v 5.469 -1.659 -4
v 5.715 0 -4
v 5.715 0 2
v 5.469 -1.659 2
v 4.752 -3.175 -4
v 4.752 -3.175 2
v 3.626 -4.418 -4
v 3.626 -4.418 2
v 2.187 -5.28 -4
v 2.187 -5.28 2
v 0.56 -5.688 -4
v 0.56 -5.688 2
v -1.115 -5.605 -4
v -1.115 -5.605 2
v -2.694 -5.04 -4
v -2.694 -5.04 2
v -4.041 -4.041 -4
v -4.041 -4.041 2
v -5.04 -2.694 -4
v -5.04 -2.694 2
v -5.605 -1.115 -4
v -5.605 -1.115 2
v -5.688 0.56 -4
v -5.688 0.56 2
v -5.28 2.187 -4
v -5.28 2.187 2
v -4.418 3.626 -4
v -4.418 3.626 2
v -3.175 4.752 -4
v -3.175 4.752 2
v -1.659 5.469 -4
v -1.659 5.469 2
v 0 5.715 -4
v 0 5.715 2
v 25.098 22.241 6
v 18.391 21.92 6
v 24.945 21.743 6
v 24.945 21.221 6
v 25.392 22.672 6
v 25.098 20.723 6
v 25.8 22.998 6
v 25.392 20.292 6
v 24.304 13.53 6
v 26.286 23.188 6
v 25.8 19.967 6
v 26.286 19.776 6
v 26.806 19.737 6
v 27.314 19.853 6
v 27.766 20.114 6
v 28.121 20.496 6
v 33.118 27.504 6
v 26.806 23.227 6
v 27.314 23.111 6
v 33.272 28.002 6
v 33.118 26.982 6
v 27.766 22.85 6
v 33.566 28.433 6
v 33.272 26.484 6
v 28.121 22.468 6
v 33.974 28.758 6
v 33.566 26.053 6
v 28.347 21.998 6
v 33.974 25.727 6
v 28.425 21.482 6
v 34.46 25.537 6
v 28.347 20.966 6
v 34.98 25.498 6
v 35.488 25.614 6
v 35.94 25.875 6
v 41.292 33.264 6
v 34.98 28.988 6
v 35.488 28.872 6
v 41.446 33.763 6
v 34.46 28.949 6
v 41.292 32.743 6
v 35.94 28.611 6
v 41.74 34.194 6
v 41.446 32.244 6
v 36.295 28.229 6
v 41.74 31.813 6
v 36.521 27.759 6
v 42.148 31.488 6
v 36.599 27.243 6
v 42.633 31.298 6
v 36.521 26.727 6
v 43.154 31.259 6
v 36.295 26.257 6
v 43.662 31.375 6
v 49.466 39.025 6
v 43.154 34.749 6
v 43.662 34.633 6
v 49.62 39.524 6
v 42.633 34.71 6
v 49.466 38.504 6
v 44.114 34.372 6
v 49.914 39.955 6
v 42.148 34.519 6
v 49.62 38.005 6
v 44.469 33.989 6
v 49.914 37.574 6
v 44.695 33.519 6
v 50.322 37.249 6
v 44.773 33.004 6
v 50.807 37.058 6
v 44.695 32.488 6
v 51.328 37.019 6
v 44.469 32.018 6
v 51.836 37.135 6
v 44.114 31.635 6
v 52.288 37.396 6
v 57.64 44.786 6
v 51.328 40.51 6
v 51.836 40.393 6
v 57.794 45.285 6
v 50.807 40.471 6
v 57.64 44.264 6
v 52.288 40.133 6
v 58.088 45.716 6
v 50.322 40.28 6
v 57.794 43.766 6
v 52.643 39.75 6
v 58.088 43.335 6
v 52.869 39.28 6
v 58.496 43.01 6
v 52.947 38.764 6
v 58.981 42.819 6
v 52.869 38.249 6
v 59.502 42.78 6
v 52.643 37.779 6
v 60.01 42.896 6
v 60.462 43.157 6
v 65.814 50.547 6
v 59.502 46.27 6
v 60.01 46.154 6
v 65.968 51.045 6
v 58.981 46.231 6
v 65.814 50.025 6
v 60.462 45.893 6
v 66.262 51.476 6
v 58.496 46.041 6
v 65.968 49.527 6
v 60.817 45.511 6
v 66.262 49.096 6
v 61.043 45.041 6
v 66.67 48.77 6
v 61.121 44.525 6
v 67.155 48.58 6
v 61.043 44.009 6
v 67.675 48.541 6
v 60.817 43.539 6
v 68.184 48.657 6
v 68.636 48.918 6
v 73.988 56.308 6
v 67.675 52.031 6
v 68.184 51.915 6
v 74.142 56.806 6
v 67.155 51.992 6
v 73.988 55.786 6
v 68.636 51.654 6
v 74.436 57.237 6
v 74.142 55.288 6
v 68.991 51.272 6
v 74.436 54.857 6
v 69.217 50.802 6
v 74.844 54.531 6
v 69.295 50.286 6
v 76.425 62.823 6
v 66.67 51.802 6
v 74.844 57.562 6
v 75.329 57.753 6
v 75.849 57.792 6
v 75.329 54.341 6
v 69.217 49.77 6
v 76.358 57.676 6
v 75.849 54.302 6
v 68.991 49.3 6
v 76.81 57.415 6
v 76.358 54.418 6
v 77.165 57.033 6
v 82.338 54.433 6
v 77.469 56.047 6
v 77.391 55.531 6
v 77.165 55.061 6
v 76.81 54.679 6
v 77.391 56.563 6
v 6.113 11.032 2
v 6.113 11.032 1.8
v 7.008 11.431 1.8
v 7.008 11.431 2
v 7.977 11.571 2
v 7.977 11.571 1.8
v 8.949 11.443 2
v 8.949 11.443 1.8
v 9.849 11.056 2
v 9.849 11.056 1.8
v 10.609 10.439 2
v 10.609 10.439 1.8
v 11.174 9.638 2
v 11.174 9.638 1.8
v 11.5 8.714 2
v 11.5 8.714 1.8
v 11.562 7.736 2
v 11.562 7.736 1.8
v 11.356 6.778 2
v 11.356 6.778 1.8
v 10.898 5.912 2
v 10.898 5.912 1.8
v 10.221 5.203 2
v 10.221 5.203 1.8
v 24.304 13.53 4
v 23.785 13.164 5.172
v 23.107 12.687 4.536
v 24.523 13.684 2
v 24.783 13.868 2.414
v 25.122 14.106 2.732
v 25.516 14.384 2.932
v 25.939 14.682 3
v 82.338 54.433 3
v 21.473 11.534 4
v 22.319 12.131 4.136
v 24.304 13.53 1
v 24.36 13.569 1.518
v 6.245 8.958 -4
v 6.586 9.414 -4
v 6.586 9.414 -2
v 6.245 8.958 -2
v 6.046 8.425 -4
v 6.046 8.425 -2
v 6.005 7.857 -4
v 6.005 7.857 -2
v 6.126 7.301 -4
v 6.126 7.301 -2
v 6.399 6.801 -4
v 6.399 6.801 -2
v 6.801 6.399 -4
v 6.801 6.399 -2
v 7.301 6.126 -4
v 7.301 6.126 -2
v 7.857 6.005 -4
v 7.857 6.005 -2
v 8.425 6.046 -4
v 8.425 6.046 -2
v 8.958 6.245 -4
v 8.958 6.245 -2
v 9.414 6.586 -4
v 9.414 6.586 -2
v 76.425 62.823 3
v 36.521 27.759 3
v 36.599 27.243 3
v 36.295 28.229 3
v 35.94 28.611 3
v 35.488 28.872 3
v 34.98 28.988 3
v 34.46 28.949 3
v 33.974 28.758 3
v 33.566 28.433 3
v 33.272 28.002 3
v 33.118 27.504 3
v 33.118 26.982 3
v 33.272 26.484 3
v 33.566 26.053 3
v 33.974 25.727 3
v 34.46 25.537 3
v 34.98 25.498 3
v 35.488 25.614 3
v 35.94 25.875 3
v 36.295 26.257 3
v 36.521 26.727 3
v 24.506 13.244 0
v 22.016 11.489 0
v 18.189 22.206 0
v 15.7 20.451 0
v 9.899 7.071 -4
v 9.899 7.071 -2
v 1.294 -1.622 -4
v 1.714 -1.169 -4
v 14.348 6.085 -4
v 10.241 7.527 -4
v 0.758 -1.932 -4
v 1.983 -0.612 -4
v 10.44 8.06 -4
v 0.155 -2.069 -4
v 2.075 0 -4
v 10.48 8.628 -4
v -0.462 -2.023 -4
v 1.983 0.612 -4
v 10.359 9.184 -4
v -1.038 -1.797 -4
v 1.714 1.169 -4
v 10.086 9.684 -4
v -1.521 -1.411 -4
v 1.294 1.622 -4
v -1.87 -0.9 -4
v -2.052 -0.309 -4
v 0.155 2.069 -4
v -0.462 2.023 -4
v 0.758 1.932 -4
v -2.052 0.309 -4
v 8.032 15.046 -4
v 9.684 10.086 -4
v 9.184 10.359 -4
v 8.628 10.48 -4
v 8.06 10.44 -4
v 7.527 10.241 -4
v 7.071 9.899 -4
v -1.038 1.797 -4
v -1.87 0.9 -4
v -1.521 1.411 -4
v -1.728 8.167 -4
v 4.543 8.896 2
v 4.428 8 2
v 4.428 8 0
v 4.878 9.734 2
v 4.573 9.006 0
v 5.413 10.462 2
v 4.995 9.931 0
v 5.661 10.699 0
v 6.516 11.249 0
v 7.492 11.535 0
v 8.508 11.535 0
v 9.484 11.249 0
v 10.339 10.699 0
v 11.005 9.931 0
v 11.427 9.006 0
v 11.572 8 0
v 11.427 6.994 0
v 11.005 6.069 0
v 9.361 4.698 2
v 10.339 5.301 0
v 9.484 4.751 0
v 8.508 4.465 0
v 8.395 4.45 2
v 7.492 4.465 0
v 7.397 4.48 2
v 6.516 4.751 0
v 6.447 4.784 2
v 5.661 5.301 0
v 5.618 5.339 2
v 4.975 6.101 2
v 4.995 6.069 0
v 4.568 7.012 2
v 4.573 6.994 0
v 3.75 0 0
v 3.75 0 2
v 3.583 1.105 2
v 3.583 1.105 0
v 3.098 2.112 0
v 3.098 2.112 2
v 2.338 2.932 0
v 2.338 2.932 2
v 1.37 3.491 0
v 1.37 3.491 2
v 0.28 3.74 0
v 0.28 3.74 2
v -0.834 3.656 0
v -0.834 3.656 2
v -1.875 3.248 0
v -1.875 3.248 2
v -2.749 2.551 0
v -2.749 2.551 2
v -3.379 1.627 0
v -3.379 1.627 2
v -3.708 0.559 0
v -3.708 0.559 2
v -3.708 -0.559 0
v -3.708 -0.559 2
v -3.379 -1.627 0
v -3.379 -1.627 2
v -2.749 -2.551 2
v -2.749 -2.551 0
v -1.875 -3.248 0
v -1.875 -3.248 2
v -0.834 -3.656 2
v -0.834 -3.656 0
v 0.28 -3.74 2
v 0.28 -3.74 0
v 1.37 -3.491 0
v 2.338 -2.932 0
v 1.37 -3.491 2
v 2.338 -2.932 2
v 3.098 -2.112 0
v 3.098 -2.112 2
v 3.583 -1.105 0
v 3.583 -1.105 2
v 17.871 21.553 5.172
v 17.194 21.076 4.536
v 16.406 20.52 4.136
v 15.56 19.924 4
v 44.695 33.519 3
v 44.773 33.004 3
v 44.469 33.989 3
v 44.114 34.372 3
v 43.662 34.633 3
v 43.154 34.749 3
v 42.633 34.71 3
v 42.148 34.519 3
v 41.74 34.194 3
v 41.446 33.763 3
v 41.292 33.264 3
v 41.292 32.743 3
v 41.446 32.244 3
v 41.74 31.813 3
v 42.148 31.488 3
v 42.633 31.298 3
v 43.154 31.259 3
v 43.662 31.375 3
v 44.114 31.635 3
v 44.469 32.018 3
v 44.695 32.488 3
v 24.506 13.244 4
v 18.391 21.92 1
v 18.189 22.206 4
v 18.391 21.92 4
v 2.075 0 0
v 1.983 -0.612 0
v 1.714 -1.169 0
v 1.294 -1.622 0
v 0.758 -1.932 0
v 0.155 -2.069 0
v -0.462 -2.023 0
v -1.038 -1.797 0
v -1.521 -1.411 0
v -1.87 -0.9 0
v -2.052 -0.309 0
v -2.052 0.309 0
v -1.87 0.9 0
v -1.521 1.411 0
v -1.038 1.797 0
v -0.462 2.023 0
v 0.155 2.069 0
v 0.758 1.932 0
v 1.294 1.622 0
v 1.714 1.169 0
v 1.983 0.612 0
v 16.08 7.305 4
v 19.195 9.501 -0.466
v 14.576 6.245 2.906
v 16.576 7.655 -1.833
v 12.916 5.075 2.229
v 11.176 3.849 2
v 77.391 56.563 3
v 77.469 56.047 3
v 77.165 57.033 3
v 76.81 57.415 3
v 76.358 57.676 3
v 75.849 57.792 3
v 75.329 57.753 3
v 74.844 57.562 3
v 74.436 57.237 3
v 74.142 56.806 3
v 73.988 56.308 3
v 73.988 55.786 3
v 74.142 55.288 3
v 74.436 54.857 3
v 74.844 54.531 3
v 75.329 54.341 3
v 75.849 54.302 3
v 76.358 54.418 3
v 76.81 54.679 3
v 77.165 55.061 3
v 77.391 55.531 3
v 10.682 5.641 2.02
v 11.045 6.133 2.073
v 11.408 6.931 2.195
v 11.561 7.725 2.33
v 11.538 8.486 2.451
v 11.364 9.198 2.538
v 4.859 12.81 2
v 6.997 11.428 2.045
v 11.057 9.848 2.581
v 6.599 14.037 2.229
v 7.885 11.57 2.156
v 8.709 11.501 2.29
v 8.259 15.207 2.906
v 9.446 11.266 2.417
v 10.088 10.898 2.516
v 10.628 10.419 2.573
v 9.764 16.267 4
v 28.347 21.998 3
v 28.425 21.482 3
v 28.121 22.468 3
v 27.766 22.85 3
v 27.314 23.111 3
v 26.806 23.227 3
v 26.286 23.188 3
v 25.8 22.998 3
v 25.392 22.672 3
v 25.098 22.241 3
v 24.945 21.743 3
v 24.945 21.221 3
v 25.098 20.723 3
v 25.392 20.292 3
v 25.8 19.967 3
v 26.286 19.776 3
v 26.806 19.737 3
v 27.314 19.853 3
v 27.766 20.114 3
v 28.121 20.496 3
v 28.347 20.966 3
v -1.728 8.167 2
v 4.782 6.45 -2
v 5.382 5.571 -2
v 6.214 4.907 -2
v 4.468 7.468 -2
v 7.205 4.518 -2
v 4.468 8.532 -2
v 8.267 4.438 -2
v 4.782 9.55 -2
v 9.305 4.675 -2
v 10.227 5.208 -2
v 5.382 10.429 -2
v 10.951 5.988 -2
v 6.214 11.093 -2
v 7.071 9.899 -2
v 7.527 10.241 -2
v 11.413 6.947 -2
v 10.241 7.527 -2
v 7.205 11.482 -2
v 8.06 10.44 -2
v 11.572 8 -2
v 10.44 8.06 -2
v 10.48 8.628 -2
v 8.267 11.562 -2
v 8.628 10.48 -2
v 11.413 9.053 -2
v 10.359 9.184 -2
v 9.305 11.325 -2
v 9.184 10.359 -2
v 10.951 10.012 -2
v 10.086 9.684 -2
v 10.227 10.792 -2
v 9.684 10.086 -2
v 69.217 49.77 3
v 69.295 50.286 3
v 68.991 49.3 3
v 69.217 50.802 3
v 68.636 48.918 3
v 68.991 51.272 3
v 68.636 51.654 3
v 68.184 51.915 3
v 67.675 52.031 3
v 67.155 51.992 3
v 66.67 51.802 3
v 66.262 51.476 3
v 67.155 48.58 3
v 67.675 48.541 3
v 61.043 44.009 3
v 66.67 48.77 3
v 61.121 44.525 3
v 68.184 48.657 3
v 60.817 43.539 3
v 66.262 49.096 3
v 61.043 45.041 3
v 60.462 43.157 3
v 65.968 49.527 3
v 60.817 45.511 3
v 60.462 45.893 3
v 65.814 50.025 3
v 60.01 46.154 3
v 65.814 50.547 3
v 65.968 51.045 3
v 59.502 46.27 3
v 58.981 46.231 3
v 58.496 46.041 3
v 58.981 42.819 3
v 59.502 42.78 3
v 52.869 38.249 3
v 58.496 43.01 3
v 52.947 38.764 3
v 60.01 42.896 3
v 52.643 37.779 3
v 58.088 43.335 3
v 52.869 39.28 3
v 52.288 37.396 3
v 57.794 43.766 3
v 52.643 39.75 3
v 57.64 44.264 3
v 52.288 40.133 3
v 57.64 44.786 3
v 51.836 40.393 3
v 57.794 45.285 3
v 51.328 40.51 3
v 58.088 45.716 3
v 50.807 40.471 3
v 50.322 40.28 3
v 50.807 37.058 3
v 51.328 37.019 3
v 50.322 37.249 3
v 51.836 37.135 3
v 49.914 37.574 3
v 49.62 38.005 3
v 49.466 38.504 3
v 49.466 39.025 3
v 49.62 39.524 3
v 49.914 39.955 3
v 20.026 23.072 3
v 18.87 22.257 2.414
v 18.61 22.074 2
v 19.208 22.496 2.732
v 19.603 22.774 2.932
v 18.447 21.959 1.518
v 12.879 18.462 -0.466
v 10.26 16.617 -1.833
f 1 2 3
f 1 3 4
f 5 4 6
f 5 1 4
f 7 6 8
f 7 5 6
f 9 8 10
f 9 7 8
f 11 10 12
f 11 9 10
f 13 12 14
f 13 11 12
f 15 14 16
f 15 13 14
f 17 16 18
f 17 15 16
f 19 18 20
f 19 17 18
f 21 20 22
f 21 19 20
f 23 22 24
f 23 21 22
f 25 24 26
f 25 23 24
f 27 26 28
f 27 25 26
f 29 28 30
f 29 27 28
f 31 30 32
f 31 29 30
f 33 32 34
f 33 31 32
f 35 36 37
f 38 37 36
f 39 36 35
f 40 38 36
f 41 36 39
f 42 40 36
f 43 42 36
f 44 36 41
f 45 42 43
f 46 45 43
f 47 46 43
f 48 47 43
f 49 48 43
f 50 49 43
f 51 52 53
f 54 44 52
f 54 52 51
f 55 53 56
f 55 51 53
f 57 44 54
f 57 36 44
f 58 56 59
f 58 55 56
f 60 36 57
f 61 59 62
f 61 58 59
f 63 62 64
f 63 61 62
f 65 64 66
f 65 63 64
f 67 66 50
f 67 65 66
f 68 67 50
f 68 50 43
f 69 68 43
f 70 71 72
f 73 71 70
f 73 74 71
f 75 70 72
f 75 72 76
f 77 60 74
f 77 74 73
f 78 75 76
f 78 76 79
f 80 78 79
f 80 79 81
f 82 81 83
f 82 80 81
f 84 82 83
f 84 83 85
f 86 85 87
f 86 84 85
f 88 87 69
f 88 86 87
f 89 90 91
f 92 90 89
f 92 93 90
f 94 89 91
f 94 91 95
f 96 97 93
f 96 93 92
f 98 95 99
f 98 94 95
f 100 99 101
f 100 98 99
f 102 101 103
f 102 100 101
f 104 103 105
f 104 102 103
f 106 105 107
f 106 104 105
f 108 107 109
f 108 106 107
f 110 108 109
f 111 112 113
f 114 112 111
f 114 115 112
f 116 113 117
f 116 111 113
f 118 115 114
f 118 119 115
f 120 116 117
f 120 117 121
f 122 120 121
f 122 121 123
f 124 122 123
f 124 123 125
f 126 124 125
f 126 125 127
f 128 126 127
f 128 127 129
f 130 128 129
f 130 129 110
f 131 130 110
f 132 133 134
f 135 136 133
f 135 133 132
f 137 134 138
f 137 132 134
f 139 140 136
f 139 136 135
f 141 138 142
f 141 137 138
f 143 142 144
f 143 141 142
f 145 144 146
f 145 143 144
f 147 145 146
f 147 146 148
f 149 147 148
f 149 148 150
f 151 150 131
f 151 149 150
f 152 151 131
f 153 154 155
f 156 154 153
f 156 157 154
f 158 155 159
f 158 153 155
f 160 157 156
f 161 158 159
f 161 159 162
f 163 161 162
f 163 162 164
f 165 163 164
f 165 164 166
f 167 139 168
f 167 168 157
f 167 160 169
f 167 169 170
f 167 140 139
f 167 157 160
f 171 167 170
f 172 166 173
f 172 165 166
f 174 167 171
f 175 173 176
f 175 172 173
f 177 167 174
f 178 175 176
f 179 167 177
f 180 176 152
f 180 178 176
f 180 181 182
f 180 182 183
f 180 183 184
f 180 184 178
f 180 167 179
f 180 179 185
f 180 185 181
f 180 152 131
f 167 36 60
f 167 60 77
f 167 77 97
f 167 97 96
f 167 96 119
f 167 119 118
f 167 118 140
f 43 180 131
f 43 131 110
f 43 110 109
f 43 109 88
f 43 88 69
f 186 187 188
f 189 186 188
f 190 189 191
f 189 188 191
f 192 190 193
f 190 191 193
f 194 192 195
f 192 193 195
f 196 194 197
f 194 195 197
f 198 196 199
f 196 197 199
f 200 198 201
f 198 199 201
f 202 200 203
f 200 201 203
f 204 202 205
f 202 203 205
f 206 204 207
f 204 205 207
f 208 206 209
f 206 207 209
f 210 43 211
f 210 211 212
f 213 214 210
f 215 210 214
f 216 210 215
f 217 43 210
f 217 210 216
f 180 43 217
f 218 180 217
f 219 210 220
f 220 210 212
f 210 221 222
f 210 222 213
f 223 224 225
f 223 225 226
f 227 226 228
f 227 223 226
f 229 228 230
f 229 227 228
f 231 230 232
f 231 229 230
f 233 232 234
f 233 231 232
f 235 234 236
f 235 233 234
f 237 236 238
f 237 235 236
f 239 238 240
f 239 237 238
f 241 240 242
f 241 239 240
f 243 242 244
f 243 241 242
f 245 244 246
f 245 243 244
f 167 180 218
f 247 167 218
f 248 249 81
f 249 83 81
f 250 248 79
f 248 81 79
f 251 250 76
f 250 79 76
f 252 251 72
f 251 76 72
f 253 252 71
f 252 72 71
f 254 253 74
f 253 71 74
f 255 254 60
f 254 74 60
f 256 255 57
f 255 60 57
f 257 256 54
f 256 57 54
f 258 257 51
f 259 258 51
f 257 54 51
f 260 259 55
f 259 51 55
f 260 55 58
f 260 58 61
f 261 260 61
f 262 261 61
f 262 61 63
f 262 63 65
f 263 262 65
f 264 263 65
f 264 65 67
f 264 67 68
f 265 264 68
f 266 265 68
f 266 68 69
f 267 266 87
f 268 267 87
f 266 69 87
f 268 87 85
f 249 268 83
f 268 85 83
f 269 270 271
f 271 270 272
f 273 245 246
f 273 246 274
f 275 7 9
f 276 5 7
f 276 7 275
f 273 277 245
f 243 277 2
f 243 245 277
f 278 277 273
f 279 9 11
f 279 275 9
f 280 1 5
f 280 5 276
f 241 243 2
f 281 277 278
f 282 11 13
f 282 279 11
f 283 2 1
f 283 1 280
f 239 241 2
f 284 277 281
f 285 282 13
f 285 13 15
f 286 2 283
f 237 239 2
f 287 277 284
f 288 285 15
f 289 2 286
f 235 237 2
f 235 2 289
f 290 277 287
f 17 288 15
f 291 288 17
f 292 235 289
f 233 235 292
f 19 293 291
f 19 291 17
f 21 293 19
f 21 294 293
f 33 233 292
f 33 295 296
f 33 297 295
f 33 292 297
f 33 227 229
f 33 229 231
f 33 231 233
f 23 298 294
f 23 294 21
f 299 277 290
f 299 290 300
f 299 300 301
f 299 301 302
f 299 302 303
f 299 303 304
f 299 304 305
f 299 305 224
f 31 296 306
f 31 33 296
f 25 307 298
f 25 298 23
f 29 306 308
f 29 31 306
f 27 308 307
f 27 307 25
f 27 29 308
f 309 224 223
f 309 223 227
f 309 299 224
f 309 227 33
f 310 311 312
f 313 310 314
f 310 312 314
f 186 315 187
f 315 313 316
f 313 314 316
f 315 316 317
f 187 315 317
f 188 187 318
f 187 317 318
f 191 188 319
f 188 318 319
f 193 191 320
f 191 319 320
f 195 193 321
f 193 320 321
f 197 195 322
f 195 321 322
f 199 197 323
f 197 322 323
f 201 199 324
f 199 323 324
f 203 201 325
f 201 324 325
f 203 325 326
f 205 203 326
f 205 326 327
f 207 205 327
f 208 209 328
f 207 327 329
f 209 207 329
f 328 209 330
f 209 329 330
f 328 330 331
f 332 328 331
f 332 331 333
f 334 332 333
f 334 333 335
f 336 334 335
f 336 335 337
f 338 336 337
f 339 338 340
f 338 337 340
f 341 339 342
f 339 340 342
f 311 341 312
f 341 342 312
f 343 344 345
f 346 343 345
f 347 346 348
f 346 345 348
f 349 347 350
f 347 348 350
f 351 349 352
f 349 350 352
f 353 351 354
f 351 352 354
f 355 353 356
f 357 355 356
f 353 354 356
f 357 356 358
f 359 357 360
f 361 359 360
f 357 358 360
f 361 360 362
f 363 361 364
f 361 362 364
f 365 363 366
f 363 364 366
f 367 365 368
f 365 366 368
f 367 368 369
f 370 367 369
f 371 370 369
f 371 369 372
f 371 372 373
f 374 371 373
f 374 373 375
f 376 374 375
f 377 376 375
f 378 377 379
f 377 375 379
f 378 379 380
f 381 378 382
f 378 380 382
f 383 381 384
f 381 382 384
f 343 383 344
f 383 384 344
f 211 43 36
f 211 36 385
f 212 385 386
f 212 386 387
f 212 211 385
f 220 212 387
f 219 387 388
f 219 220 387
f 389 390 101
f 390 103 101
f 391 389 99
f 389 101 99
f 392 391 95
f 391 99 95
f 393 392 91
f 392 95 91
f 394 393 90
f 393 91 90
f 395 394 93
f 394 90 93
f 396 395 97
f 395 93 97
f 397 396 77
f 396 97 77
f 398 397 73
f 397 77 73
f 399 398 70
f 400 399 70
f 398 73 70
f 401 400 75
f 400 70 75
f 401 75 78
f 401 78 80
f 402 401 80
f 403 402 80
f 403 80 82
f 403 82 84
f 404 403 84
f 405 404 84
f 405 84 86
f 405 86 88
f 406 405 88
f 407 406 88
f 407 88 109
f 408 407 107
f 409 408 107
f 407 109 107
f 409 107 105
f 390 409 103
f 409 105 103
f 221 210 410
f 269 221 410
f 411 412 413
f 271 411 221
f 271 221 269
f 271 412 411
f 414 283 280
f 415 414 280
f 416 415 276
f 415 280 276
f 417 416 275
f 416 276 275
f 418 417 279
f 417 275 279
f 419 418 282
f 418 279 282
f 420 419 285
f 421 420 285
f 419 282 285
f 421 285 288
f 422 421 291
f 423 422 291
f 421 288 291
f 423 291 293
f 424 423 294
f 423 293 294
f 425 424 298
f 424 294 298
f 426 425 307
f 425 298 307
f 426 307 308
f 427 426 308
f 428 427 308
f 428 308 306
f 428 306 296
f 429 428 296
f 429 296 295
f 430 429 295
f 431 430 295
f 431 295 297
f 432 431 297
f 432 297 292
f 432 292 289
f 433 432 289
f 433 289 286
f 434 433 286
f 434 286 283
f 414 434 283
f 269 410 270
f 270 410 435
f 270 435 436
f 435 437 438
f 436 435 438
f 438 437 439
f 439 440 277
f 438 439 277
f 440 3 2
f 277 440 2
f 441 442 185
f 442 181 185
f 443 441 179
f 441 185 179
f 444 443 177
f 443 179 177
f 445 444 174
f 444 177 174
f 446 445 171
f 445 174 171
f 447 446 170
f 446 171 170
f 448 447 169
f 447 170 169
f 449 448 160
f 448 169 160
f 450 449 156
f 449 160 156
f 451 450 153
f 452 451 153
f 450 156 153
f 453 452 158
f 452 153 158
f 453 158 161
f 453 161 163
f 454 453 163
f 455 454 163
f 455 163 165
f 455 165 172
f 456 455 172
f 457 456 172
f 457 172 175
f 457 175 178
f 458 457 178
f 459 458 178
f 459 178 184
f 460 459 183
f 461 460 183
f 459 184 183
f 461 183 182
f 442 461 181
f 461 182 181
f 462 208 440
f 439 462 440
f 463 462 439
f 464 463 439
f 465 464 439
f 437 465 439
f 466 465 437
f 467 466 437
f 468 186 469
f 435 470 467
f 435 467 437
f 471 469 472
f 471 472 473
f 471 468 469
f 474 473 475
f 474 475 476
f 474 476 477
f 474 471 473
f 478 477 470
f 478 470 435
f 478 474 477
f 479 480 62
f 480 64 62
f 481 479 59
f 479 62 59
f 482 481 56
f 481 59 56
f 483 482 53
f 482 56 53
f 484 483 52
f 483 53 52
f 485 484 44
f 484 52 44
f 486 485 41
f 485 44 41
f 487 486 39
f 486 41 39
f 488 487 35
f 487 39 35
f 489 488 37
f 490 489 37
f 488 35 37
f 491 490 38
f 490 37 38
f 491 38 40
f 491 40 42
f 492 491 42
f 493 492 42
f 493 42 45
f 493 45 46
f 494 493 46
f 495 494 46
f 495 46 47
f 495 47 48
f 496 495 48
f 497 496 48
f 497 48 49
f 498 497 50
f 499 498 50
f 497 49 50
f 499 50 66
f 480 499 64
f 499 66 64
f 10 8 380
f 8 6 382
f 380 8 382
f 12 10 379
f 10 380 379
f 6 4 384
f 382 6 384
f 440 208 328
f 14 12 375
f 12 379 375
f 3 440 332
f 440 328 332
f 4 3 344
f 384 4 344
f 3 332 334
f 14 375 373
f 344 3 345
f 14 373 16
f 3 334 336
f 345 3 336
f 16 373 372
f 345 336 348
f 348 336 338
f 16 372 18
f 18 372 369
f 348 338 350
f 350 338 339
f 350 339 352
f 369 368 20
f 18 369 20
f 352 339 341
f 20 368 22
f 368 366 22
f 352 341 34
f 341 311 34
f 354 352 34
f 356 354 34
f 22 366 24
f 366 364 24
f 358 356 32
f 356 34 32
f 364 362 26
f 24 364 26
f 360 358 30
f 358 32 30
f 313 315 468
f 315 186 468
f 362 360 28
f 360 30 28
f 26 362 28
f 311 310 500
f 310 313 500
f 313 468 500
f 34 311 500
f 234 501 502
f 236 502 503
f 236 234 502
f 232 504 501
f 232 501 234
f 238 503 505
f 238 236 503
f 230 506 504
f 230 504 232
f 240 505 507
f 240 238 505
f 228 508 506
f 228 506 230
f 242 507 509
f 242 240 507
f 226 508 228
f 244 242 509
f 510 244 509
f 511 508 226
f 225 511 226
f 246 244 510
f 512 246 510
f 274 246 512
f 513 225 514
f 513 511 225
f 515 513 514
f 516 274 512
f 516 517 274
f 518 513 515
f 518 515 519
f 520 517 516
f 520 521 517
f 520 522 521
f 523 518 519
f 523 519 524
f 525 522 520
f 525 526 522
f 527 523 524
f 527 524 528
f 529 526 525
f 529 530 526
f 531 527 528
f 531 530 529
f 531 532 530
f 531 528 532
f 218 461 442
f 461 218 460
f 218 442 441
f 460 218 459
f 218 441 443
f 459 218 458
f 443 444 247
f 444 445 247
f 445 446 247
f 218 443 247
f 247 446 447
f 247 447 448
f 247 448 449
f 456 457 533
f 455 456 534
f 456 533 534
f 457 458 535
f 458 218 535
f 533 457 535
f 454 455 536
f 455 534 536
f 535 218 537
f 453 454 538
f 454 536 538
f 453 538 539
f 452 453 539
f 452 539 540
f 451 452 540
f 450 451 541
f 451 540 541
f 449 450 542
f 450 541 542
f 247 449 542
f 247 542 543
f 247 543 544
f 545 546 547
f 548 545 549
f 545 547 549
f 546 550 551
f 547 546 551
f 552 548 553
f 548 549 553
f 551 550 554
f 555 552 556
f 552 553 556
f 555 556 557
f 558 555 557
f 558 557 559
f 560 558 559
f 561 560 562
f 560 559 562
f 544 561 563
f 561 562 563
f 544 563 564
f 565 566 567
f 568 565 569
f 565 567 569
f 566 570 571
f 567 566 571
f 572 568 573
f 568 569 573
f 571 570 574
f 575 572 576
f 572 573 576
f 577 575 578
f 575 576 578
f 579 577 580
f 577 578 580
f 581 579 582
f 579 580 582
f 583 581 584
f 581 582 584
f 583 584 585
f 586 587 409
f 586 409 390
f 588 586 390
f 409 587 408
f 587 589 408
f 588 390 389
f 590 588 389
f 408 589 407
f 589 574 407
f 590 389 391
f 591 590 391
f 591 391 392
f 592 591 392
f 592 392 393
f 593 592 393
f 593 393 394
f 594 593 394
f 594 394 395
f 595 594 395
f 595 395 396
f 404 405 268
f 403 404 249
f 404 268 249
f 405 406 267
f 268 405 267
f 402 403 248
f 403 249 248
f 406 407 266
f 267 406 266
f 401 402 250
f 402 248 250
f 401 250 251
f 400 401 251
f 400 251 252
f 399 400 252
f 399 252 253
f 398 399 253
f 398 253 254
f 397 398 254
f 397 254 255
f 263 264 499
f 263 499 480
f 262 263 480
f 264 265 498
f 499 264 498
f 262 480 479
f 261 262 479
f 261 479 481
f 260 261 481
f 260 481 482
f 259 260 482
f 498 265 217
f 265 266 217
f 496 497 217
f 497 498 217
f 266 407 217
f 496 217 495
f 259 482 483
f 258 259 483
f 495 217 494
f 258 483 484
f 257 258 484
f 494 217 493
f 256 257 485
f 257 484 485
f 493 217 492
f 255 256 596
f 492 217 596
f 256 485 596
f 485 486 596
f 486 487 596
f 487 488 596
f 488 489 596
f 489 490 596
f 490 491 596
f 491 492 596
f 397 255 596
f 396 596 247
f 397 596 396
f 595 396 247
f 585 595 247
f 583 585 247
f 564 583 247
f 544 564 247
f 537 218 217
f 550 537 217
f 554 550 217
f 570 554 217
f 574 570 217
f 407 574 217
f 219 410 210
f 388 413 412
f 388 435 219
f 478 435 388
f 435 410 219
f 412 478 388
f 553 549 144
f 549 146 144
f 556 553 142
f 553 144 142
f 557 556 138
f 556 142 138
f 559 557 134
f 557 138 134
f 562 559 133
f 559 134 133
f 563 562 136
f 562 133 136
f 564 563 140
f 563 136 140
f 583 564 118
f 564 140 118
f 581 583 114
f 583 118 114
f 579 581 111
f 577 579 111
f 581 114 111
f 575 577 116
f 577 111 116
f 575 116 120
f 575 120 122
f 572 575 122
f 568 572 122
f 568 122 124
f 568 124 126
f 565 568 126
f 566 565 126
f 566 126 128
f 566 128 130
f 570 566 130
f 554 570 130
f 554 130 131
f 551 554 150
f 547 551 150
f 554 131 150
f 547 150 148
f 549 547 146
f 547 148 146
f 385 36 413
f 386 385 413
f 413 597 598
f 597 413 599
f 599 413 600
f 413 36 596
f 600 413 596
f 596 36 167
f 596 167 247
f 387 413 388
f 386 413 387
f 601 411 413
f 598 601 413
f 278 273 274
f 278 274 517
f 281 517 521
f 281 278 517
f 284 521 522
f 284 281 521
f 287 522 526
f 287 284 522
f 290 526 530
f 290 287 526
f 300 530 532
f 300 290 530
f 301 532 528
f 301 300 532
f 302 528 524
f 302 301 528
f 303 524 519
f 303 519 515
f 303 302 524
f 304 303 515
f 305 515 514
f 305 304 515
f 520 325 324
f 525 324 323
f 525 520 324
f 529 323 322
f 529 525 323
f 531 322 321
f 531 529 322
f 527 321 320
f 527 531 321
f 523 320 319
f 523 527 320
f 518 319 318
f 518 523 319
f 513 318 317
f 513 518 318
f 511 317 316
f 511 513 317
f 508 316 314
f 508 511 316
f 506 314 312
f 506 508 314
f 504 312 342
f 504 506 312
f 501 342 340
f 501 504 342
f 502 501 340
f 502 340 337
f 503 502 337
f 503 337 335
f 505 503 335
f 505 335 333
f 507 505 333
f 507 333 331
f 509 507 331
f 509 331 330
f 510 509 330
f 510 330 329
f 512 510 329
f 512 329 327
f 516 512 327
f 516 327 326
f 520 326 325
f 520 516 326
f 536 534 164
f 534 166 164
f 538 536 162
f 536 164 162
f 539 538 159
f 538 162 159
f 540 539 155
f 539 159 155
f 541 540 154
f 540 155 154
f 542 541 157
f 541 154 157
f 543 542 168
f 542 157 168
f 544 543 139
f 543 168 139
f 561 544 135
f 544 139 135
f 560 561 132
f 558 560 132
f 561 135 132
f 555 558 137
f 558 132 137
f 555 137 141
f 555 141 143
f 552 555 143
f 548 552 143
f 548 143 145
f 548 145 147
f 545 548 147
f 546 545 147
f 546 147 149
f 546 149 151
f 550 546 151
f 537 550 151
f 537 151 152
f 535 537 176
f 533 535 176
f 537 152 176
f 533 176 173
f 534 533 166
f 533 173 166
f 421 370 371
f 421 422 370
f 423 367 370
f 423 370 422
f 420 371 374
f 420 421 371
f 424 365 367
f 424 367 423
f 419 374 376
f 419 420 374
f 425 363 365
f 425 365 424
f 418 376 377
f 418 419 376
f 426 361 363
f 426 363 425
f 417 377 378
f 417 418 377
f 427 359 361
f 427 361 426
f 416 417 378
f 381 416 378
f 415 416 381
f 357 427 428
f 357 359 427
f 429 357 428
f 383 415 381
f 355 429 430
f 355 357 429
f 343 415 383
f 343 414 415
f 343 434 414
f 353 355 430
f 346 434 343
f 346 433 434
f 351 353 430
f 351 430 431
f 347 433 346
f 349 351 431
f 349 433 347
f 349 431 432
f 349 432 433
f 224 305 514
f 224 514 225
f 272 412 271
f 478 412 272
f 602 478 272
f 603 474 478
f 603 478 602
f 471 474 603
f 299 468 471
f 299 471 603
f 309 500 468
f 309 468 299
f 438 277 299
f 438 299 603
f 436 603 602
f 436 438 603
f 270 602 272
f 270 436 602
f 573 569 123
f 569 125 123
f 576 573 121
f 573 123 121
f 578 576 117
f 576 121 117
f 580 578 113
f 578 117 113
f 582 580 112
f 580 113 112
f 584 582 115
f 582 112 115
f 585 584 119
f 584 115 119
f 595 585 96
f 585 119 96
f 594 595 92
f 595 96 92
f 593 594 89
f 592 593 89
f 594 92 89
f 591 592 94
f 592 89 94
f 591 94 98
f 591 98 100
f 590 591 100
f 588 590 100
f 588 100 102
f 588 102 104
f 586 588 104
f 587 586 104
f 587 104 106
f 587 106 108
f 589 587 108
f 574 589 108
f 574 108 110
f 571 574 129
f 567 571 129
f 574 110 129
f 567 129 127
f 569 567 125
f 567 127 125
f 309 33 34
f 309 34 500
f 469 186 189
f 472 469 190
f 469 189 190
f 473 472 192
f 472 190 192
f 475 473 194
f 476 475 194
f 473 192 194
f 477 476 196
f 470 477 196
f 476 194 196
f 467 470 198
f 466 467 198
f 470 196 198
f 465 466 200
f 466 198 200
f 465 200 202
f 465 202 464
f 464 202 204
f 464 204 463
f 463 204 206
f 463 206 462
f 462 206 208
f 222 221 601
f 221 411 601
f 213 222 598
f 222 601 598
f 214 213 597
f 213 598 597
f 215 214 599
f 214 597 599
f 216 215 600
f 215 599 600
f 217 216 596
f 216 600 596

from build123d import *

# Parameters (mm, degrees)
SKETCH_1_R                     = 2.1
EXTRUDE_1_DEPTH                = 2
EXTRUDE_2_DEPTH                = 40
EXTRUDE_3_DEPTH                = 2
EXTRUDE_START                  = -4
SKETCH_10_R                    = 2.075
EXTRUDE_4_DEPTH                = 4
SKETCH_14_R                    = 3.5715559825460215
CUT_EXTRUDE_6_DEPTH            = 4
EXTRUDE_5_DEPTH                = 2
EXTRUDE_START_2                = 2
SKETCH_19_R                    = 2.075
EXTRUDE_6_DEPTH                = 2
CUT_EXTRUDE_START              = -2
SKETCH_22_R                    = 3.5715559825460206
CUT_EXTRUDE_11_DEPTH           = 2
SKETCH_23_R                    = 3.75
CUT_EXTRUDE_12_DEPTH           = 2
FILLET_5_R                     = 13
FILLET_6_R                     = 10
CUT_EXTRUDE_13_DEPTH           = 28.999999999999996
CUT_EXTRUDE_14_DEPTH           = 12.999999999999984
SKETCH_29_R                    = 3.0000000000000084
SKETCH_29_R_2                  = 3.0000000000000018
SKETCH_29_R_3                  = 1.2000000000000004
EXTRUDE_8_DEPTH                = 13
CUT_EXTRUDE_15_DEPTH           = 13
M3X0_5_1_D                     = 2.8
FILLET_8_R                     = 5
EXTRUDE_9_DEPTH                = 1.9999999999999991
EXTRUDE_10_DEPTH               = 4.5
EXTRUDE_11_DEPTH               = 0.5
FILLET_9_R                     = 0.5
CUT_EXTRUDE_16_DEPTH           = 9.500000000000002
EXTRUDE_12_DEPTH               = 2
CUT_EXTRUDE_17_DEPTH           = 50.00000000000002
SKETCH_42_W                    = 39.21300819263915
SKETCH_42_H                    = 42.57339221101679
CUT_EXTRUDE_19_DEPTH           = 50.00000000000002
SKETCH_44_W                    = 3.999999999999999
SKETCH_44_H                    = 10.963872604458988
EXTRUDE_13_DEPTH               = 60.00000000000003
SKETCH_45_W                    = 1.9999999999999996
SKETCH_45_H                    = 10.963872604458988
CUT_EXTRUDE_20_DEPTH           = 73.00000000000004
SKETCH_46_R                    = 1.7500000000000004
SKETCH_46_R_2                  = 1.7500000000000038
SKETCH_46_R_3                  = 1.749999999999997
SKETCH_46_R_4                  = 1.7500000000000104
CUT_EXTRUDE_21_DEPTH           = 70.00000000000003
SKETCH_47_W                    = 1.9999999999999996
SKETCH_47_H                    = 10.963872604458988
CUT_EXTRUDE_22_DEPTH           = 1.9999999999999967
CUT_EXTRUDE_23_DEPTH           = 10
EXTRUDE_16_DEPTH               = 73.00000000000003
SKETCH_52_R                    = 1.7500000000000104
SKETCH_52_R_2                  = 1.749999999999997
SKETCH_52_R_3                  = 1.7500000000000038
SKETCH_52_R_4                  = 1.7500000000000004
CUT_EXTRUDE_24_DEPTH           = 73.00000000000003
SPLIT_BODIES_1_SURFACE_1_BACK  = 112.869
SPLIT_BODIES_1_SURFACE_1_DEPTH = 225.738
SPLIT_BODIES_1_SURFACE_2_BACK  = 112.869
SPLIT_BODIES_1_SURFACE_2_DEPTH = 225.738
FILLET_11_R                    = 2
FILLET_12_R                    = 4


# Read off the part's stored shape, not the designer's step: 实体-删除/保留 1
with BuildPart() as part:
    # 草图1 → 凸台-拉伸1 (new body)
    with BuildSketch(Plane.XY):
        with BuildLine():
            Line((5.715095935783956, 0), (15.341111112939824, 6.784600591097247))
            Line((15.341111112939824, 6.784600591097247), (42.49706355926069, 25.92463804463833))
            Line((42.49706355926069, 25.92463804463833), (52.86691877711603, 11.211850995247643))
            Line((52.86691877711603, 11.211850995247643), (93.73577169209018, 40.017004378179195))
            Line((93.73577169209018, 40.017004378179195), (42.483411773869754, 112.7340328625418))
            Line((42.483411773869754, 112.7340328625418), (1.6145588588956372, 83.92887947961026))
            Line((1.6145588588956372, 83.92887947961026), (36.18074291841349, 34.88625598164134))
            Line((36.18074291841349, 34.88625598164134), (-1.7283092029758853, 8.167227110682408))
            Line((-1.7283092029758853, 8.167227110682408), (0, 5.715095935783956))
            ThreePointArc((0, 5.715095935783956), (-4.0411830913245135, -4.041183091324513), (5.715095935783956, 0))
        make_face()
        Circle(SKETCH_1_R, mode=Mode.SUBTRACT)
        with BuildLine():
            Line((7.071067811864017, 9.899494936610912), (6.585786437625429, 9.414213562372302))
            ThreePointArc((6.585786437625429, 9.414213562372302), (6.585786437625458, 6.585786437626118), (9.41421356237164, 6.58578643762615))
            Line((9.41421356237164, 6.58578643762615), (9.899494936610207, 7.071067811864724))
            ThreePointArc((9.899494936610207, 7.071067811864724), (9.899494936610207, 9.899494936610912), (7.071067811864017, 9.899494936610912))
        make_face(mode=Mode.SUBTRACT)
    extrude(amount=EXTRUDE_1_DEPTH)

    # 草图2 → 凸台-拉伸2 (add)
    with BuildSketch(Plane.XY.offset(2)):
        Polygon((2.4787134603835828, 82.70281389216105), (42.12150078790845, 110.64381267360466), (91.64555150315304, 40.37891536414052), (52.00276417562808, 12.43791658269687), (52.86691877711603, 11.211850995247648), (93.73577169209018, 40.017004378179195), (42.483411773869754, 112.7340328625418), (1.6145588588956372, 83.92887947961026), align=None)
    extrude(amount=EXTRUDE_2_DEPTH)

    # 草图4 → 凸台-拉伸3 (add)
    with BuildSketch(Plane.XY.offset(42)):
        Polygon((93.73577169209018, 40.017004378179195), (52.86691877711603, 11.211850995247648), (1.6145588588956372, 83.92887947961026), (42.483411773869754, 112.7340328625418), align=None)
    extrude(amount=EXTRUDE_3_DEPTH)

    # 草图10 → 凸台-拉伸4 (add)
    with BuildSketch(Plane.XY.offset(2).offset(EXTRUDE_START)):
        with BuildLine():
            Line((8.031882820422537, 15.046398123036559), (14.348203461269724, 6.084780186033628))
            Line((14.348203461269724, 6.084780186033628), (5.715095935783956, 0))
            ThreePointArc((5.715095935783956, 0), (-4.0411830913245135, -4.041183091324513), (0, 5.715095935783956))
            Line((0, 5.715095935783956), (-1.7283092029758853, 8.167227110682408))
            Line((-1.7283092029758853, 8.167227110682408), (8.031882820422537, 15.046398123036559))
        make_face()
        Circle(SKETCH_10_R, mode=Mode.SUBTRACT)
        with BuildLine():
            Line((7.071067811864017, 9.899494936610912), (6.58578643762543, 9.4142135623723))
            ThreePointArc((6.58578643762543, 9.4142135623723), (6.585786437625461, 6.585786437626118), (9.414213562371643, 6.58578643762615))
            Line((9.414213562371643, 6.58578643762615), (9.899494936610205, 7.071067811864723))
            ThreePointArc((9.899494936610205, 7.071067811864723), (9.899494936610207, 9.899494936610912), (7.071067811864017, 9.899494936610912))
        make_face(mode=Mode.SUBTRACT)
    extrude(amount=EXTRUDE_4_DEPTH)

    # 草图14 → 切除-拉伸6 (cut)
    with BuildSketch(Plane(origin=(0, 0, 0), x_dir=(-1, 0, 0), z_dir=(0, 0, -1))):
        with Locations((-7.999999999998536, 7.999999999999225)):
            Circle(SKETCH_14_R)
    extrude(amount=-CUT_EXTRUDE_6_DEPTH, mode=Mode.SUBTRACT)

    # 草图17 → 凸台-拉伸5 (add)
    with BuildSketch(Plane.XY.offset(2)):
        Polygon((9.763733946874806, 16.267040097932394), (16.080054587722028, 7.305422160929461), (83.36591647423481, 54.72979142756991), (77.0495958333876, 63.691409364572834), align=None)
    extrude(amount=EXTRUDE_5_DEPTH)

    # 草图19 → 凸台-拉伸6 (add)
    with BuildSketch(Plane(origin=(0, 0, -2), x_dir=(-1, 0, 0), z_dir=(0, 0, -1)).offset(EXTRUDE_START_2)):
        with BuildLine():
            Line((1.7283092029758853, 8.167227110682408), (-8.031882820422537, 15.046398123036559))
            Line((-8.031882820422537, 15.046398123036559), (-14.348203461269724, 6.084780186033628))
            Line((-14.348203461269724, 6.084780186033628), (-5.715095935783956, 0))
            ThreePointArc((-5.715095935783956, 0), (4.041183091324512, -4.0411830913245135), (3.5e-16, 5.715095935783956))
            Line((3.5e-16, 5.715095935783956), (1.7283092029758853, 8.167227110682408))
        make_face()
        with Locations(Location((0, 0, 0), (0, 0, 180))):
            Circle(SKETCH_19_R, mode=Mode.SUBTRACT)
        with BuildLine():
            Line((-9.414213562371643, 6.58578643762615), (-9.899494936610205, 7.071067811864723))
            ThreePointArc((-9.899494936610205, 7.071067811864723), (-9.899494936610207, 9.899494936610914), (-7.071067811864017, 9.899494936610912))
            Line((-7.071067811864017, 9.899494936610912), (-6.58578643762543, 9.4142135623723))
            ThreePointArc((-6.58578643762543, 9.4142135623723), (-6.585786437625462, 6.585786437626118), (-9.414213562371643, 6.58578643762615))
        make_face(mode=Mode.SUBTRACT)
    extrude(amount=-EXTRUDE_6_DEPTH)

    # 草图22 → 切除-拉伸11 (cut)
    with BuildSketch(Plane.XY.offset(CUT_EXTRUDE_START)):
        with Locations((7.999999999998536, 7.999999999999225)):
            Circle(SKETCH_22_R)
    extrude(amount=CUT_EXTRUDE_11_DEPTH, mode=Mode.SUBTRACT)

    # 草图23 → 切除-拉伸12 (cut)
    with BuildSketch(Plane.XY.offset(2)):
        Circle(SKETCH_23_R)
    extrude(amount=-CUT_EXTRUDE_12_DEPTH, mode=Mode.SUBTRACT)

    # 圆角5
    # the kernel refuses this fillet: 13 mm, written as the material it adds along each edge
    with BuildSketch(Plane(origin=(14.348203461269723, 6.084780186033624, 2.2e-16), x_dir=(8e-16, 5.7e-16, -1), z_dir=(-0.5761030676586291, 0.8173770582994835, 0))) as fillet_5_piece_1:
        with BuildLine():
            CenterArc((13.000000000000009, -9.38083151964685), FILLET_5_R, 133.81306146040322, 46.18693853959684)
            Line((9.43e-15, -9.380831519646863), (-0.25999999999999057, -9.380831519646863))
            Line((-0.25999999999999057, -9.380831519646863), (-0.26, 3.4e-16))
            Line((-0.26, 3.4e-16), (-2.6e-16, 0.26000000000000023))
            ThreePointArc((-2.6e-16, 0.26000000000000023), (1.9999999999999998, 0.2599999999999987), (3.8200000000000003, 0.1876166303929368))
            Line((3.8200000000000003, 0.1876166303929368), (4, 0))
        make_face()
    extrude(amount=10.963872604458924)

    # 圆角6
    # the kernel refuses this fillet: 10 mm, written as the material it adds along each edge
    with BuildSketch(Plane(origin=(9.763733946874806, 16.267040097932394, 2), x_dir=(-0.8173770582994822, -0.5761030676586308, 0), z_dir=(0.576103067658631, -0.8173770582994822, 0))) as fillet_6_piece_1_section:
        with BuildLine():
            CenterArc((6.000000000000636, -10.000000000000002), FILLET_6_R, 90, 36.86989764584695)
            Line((2.2818e-13, -2.000000000000304), (-0.11999999999977938, -1.8400000000003103))
            ThreePointArc((-0.11999999999977938, -1.8400000000003103), (-0.20000000000000048, -1.000000000000152), (-0.20000000000000048, 0))
            Line((-0.20000000000000048, 0), (-1.45e-15, 0.2))
            Line((-1.45e-15, 0.2), (6.000000000000636, 0.2))
            Line((6.000000000000636, 0.2), (6.000000000000636, 0))
        make_face()
    fillet_6_piece_1 = extrude(amount=10.963872604458947, mode=Mode.PRIVATE)
    fillet_6_piece_1 = fillet_6_piece_1 - Plane(origin=(7.999999999998536, 7.999999999999225, 2), x_dir=(-1, 0, 0), z_dir=(0, 0, -1)) * Cylinder(3.5715559825460215, 46, mode=Mode.PRIVATE)
    add(fillet_6_piece_1)

    # 草图24 → 切除-拉伸13 (cut)
    with BuildSketch(Plane.XY.offset(44.00000000000001)):
        Polygon((1.6145588588956372, 83.92887947961026), (42.483411773869754, 112.7340328625418), (93.73577169209018, 40.017004378179195), (52.86691877711603, 11.211850995247648), (2.4787134603835828, 82.70281389216105), align=None)
    extrude(amount=-CUT_EXTRUDE_13_DEPTH, mode=Mode.SUBTRACT)

    # 草图25 → 切除-拉伸14 (cut)
    with BuildSketch(Plane.XY.offset(15.000000000000007)):
        Polygon((2.4787134603835828, 82.70281389216105), (1.6145588588956372, 83.92887947961026), (42.48341177386975, 112.7340328625418), (93.73577169209018, 40.017004378179195), (52.86691877711603, 11.211850995247648), (52.00276417562802, 12.437916582696838), (91.64555150315304, 40.37891536414052), (42.12150078790842, 110.64381267360463), align=None)
    extrude(amount=-CUT_EXTRUDE_14_DEPTH, mode=Mode.SUBTRACT)

    # 草图29 → 凸台-拉伸8 (add)
    with BuildSketch(Plane.XY.offset(2)):
        with Locations(Location((86.76837106229962, 41.223374331383454, 0), (0, 0, 180))):
            Circle(SKETCH_29_R)
        with Locations(Location((51.2228117877621, 91.65553882846152, 0), (0, 0, 180))):
            Circle(SKETCH_29_R_2)
        with Locations(Location((35.247091362615166, 45.46860572527032, 0), (0, 0, 180))):
            Circle(SKETCH_29_R_3)
    extrude(amount=EXTRUDE_8_DEPTH)

    # 草图30 → 切除-拉伸15 (cut)
    with BuildSketch(Plane.XY.offset(2)):
        Polygon((1.6145588588956372, 83.92887947961026), (42.48341177386975, 112.7340328625418), (53.29333634245431, 97.39687387080285), (12.424483427480185, 68.59172048787134), align=None)
    extrude(amount=-CUT_EXTRUDE_15_DEPTH, mode=Mode.SUBTRACT)

    # M3x0.5 螺纹孔1 (through all)
    with Locations(Plane.XY.offset(15)):
        with Locations((51.222811788, 91.655538828), (86.768371062, 41.223374331)):
            Hole(M3X0_5_1_D / 2)

    # 圆角8
    # the kernel refuses this fillet: 5 mm, written as the material it takes off along each edge
    with BuildSketch(Plane(origin=(52.86691877711603, 11.21185099524764, -12.500000000000018), x_dir=(-0.57610306765863, 0.8173770582994827, 0), z_dir=(0, 1.2e-16, 1))) as fillet_8_piece_1:
        with BuildLine():
            CenterArc((FILLET_8_R, -FILLET_8_R), FILLET_8_R, 90.00000000000001, 90.00000000000011)
            Line((4.76e-15, -FILLET_8_R), (0, 0))
            Line((0, 0), (FILLET_8_R, 1e-17))
        make_face()
    extrude(amount=27.000000000000057, mode=Mode.SUBTRACT)
    with BuildSketch(Plane(origin=(93.73577169209018, 40.017004378179195, -12.499999999999993), x_dir=(-0.8173770582994824, -0.5761030676586305, 0), z_dir=(0, 0, 1))) as fillet_8_piece_2:
        with BuildLine():
            CenterArc((FILLET_8_R, -FILLET_8_R), FILLET_8_R, 90, 90)
            Line((-5.2e-16, -FILLET_8_R), (0, 0))
            Line((0, 0), (FILLET_8_R, -2.3e-16))
        make_face()
    extrude(amount=27.000000000000007, mode=Mode.SUBTRACT)
    with BuildSketch(Plane(origin=(12.424483427480185, 68.59172048787134, 14.499999999999991), x_dir=(0.5761030676586302, -0.8173770582994826, 0), z_dir=(0, 0, -1))) as fillet_8_piece_3:
        with BuildLine():
            CenterArc((FILLET_8_R, -FILLET_8_R), FILLET_8_R, 90, 89.99999999999989)
            Line((-6.63e-15, -FILLET_8_R), (0, 0))
            Line((0, 0), (FILLET_8_R, -4e-16))
        make_face()
    extrude(amount=26.999999999999982, mode=Mode.SUBTRACT)
    with BuildSketch(Plane(origin=(53.29333634245431, 97.39687387080285, 14.499999999999993), x_dir=(-0.8173770582994824, -0.5761030676586305, 0), z_dir=(0, 0, -1))) as fillet_8_piece_4:
        with BuildLine():
            CenterArc((FILLET_8_R, -FILLET_8_R), FILLET_8_R, 90, 90)
            Line((5.2e-16, -FILLET_8_R), (0, 0))
            Line((0, 0), (FILLET_8_R, 2.3e-16))
        make_face()
    extrude(amount=26.999999999999986, mode=Mode.SUBTRACT)

    # 草图35 → 凸台-拉伸9 (add)
    with BuildSketch(Plane.XY.offset(2)):
        Polygon((83.9272469924964, 33.10376756627563), (63.492820535009336, 18.701190874809864), (72.1343665498888, 6.440535000317625), (92.56879300737585, 20.843111691783392), align=None)
    extrude(amount=-EXTRUDE_9_DEPTH)

    # 草图36 → 凸台-拉伸10 (add)
    with BuildSketch(Plane.XY.offset(2)):
        Polygon((83.9272469924964, 33.10376756627563), (88.65129214729717, 26.401275688219865), (87.69528224340063, 25.727461525276922), (84.0082226103854, 30.95867469839361), (64.52980605679488, 17.2299121698708), (63.49282053500935, 18.70119087480987), align=None)
        Polygon((72.1343665498888, 6.440535000317625), (92.56879300737585, 20.843111691783392), (91.5318074855903, 22.31439039672246), (71.09738102810324, 7.911813705256714), align=None)
    extrude(amount=EXTRUDE_10_DEPTH)

    # 草图38 → 凸台-拉伸11 (add)
    with BuildSketch(Plane.XY.offset(6.5)):
        Polygon((71.20701372358899, 21.936136526395817), (79.77043226489411, 27.97179857636138), (80.48699168922953, 26.955141545284572), (71.92357314792442, 20.919479495319017), align=None)
        Polygon((86.2422183193346, 18.586186241257604), (77.41533643660377, 12.36483016223927), (76.64618005583336, 13.456111940066782), (85.47306193856419, 19.677468019085115), align=None)
    extrude(amount=-EXTRUDE_11_DEPTH)

    # 圆角9
    fillet_9_edges = [part.edges().sort_by_distance(p)[0] for p in [
        (75.48872299424156, 24.953967551378597, 6),
        (81.82877737796917, 15.475508201748436, 6),
    ]]
    fillet(fillet_9_edges, radius=FILLET_9_R)

    # 草图40 → 切除-拉伸16 (cut)
    with BuildSketch(Plane.XY.offset(2)):
        Polygon((65.96583570106971, 15.192468260678279), (69.64530996532923, 9.972017235426623), (86.89967078383748, 22.133222516514135), (83.22019651957794, 27.353673541765804), align=None)
        Polygon((79.13062239501116, 33.15597569096527), (85.72890544742685, 37.806572461671124), (80.1765478028438, 45.68427701304691), (50.06316674834756, 24.459787009423422), (55.61552439293061, 16.582082458047644), align=None)
        Polygon((39.25145299063004, 45.68427701304691), (67.37307339397086, 65.5049358110826), (63.37371277016225, 71.17924272816451), (35.25209236682142, 51.35858393012882), align=None)
        Polygon((30.685761748669528, 51.952517364922464), (63.37371277016222, 74.99161378651206), (59.82181706782164, 80.03105589947442), (27.133866046328958, 56.99195947788482), align=None)
        Polygon((26.06105069463626, 58.51407367149419), (23.152992111790248, 62.64003741522087), (55.84094313328293, 85.6791338368105), (58.74900171612895, 81.55317009308379), align=None)
        Polygon((21.894829409934886, 64.42512308102752), (19.378576670767988, 67.99519131593051), (49.49195772526422, 89.2196813195541), (51.98740367066816, 85.6791338368105), align=None)
    extrude(amount=-CUT_EXTRUDE_16_DEPTH, mode=Mode.SUBTRACT)

    # 草图41 → 凸台-拉伸12 (add)
    with BuildSketch(Plane.XY.offset(2)):
        Polygon((69.64530996532923, 9.972017235426623), (65.96583570106971, 15.192468260678279), (66.98240526122602, 15.908966033827006), (70.66187952548556, 10.688515008575354), align=None)
    extrude(amount=-EXTRUDE_12_DEPTH)

    # 草图3 → 切除-拉伸17 (cut)
    with BuildSketch(Plane.XY.offset(42)):
        Polygon((1.6145588588956372, 83.92887947961026), (52.86691877711603, 11.211850995247648), (93.73577169209018, 40.017004378179195), (42.48341177386975, 112.7340328625418), align=None)
    extrude(amount=-CUT_EXTRUDE_17_DEPTH, mode=Mode.SUBTRACT)


with BuildPart() as cut_extrude_17_piece_1:
    # of the separate pieces the step leaves, piece 1, a body of its own (cut_extrude_17_pieces)
    add(part.part.solids().sort_by_distance((22.015879933, 11.489106002, 0))[0])


with BuildPart() as cut_extrude_17_piece_2:
    # of the separate pieces the step leaves, piece 2, a body of its own (cut_extrude_17_pieces)
    add(part.part.solids().sort_by_distance((71.207013724, 21.936136526, 5.5))[0])


with BuildPart() as cut_extrude_19_tool:
    # 草图42 → 切除-拉伸19 (new body)
    with BuildSketch(Plane.XY.offset(6.5)):
        Polygon((28.815346269643545, 29.694982797748935), (35.13166691049081, 20.73336486074598), (48.41112186379118, 17.53375132498441), (30.419712241827142, 43.06002656463614), align=None)
        with Locations((76.58542458379063, 21.286696105508394)):
            Rectangle(SKETCH_42_W, SKETCH_42_H)
    extrude(amount=-CUT_EXTRUDE_19_DEPTH)


with BuildPart() as cut_extrude_17_piece_1_1:
    add(cut_extrude_17_piece_1.part)

    # 切除-拉伸19: cut by cut_extrude_19_tool
    add(cut_extrude_19_tool.part, mode=Mode.SUBTRACT)

    # 草图44 → 凸台-拉伸13 (add)
    with BuildSketch(Plane(origin=(33.234856604715326, 23.424565992842005, 0), x_dir=(0, 0, -1), z_dir=(0.817377058299481, 0.5761030676586324, 0))):
        with Locations((-1.9999999999999996, 2.18945200166085)):
            Rectangle(SKETCH_44_W, SKETCH_44_H)
    extrude(amount=EXTRUDE_13_DEPTH)

    # 草图45 → 切除-拉伸20 (cut)
    with BuildSketch(Plane(origin=(82.27748010268421, 57.990750052359964, 0), x_dir=(0, 0, -1), z_dir=(0.817377058299481, 0.5761030676586324, 0))):
        with Locations((-2.999999999999999, 2.18945200166085)):
            Rectangle(SKETCH_45_W, SKETCH_45_H)
    extrude(amount=-CUT_EXTRUDE_20_DEPTH, mode=Mode.SUBTRACT)

    # 草图46 → 切除-拉伸21 (cut)
    with BuildSketch(Plane.XY.offset(1.9999999999999996)):
        with Locations((26.674994885127283, 21.482049818624887)):
            Circle(SKETCH_46_R)
        with Locations((34.848933258484564, 27.242842426292455)):
            Circle(SKETCH_46_R_2)
        with Locations((43.022871631841845, 33.003635033960016)):
            Circle(SKETCH_46_R_2)
        with Locations((51.19681000519913, 38.76442764162759)):
            Circle(SKETCH_46_R_3)
        with Locations((59.370748378556414, 44.52522024929516)):
            Circle(SKETCH_46_R_3)
        with Locations((67.5446867519137, 50.28601285696273)):
            Circle(SKETCH_46_R_4)
        with Locations((75.71862512527099, 56.04680546463029)):
            Circle(SKETCH_46_R_4)
    extrude(amount=-CUT_EXTRUDE_21_DEPTH, mode=Mode.SUBTRACT)

    # 草图47 → 切除-拉伸22 (cut)
    with BuildSketch(Plane(origin=(82.27748010268421, 57.990750052359964, 0), x_dir=(0, 0, -1), z_dir=(0.817377058299481, 0.5761030676586324, 0))):
        with Locations((-0.9999999999999998, 2.18945200166085)):
            Rectangle(SKETCH_47_W, SKETCH_47_H)
    extrude(amount=-CUT_EXTRUDE_22_DEPTH, mode=Mode.SUBTRACT)

    # 草图48 → 切除-拉伸23 (cut)
    with BuildSketch(Plane.XY.offset(1.9999999999999996)):
        Polygon((24.50576515259755, 13.244024981183752), (82.53953629186074, 54.14734278494668), (82.33790021818015, 54.433424755351595), (24.304129078917033, 13.530106951588571), align=None)
        Polygon((18.39108058543081, 21.9195609477819), (18.18944451175029, 22.20564291818672), (76.22321565101348, 63.10896072194963), (76.42485172469398, 62.82287875154481), align=None)
    extrude(amount=-CUT_EXTRUDE_23_DEPTH, mode=Mode.SUBTRACT)

    # 草图51 → 凸台-拉伸16 (add)
    with BuildSketch(Plane(origin=(80.64272598608528, 56.838543917042685, 0), x_dir=(0, 0, -1), z_dir=(0.8173770582994812, 0.5761030676586322, 0))):
        Polygon((-1.9999999999999996, 7.321388303890359), (-2.9999999999999996, 7.321388303890359), (-2.9999999999999982, -2.942484300568633), (-1.9999999999999982, -2.942484300568633), align=None)
    extrude(amount=-EXTRUDE_16_DEPTH)

    # 草图52 → 切除-拉伸24 (cut)
    with BuildSketch(Plane(origin=(0, 0, 0), x_dir=(-1, 0, 0), z_dir=(0, 0, -1))):
        with Locations(Location((-67.5446867519137, 50.28601285696273, 0), (0, 0, 180))):
            Circle(SKETCH_52_R)
        with Locations(Location((-75.71862512527099, 56.04680546463029, 0), (0, 0, 180))):
            Circle(SKETCH_52_R)
        with Locations(Location((-59.370748378556414, 44.52522024929516, 0), (0, 0, 180))):
            Circle(SKETCH_52_R_2)
        with Locations(Location((-51.19681000519913, 38.76442764162759, 0), (0, 0, 180))):
            Circle(SKETCH_52_R_2)
        with Locations(Location((-43.022871631841845, 33.003635033960016, 0), (0, 0, 180))):
            Circle(SKETCH_52_R_3)
        with Locations(Location((-34.848933258484564, 27.242842426292455, 0), (0, 0, 180))):
            Circle(SKETCH_52_R_3)
        with Locations(Location((-26.674994885127283, 21.482049818624887, 0), (0, 0, 180))):
            Circle(SKETCH_52_R_4)
    extrude(amount=-CUT_EXTRUDE_24_DEPTH, mode=Mode.SUBTRACT)


with BuildPart() as cut_extrude_17_piece_2_1:
    add(cut_extrude_17_piece_2.part)

    # 切除-拉伸19: cut by cut_extrude_19_tool
    add(cut_extrude_19_tool.part, mode=Mode.SUBTRACT)


with BuildPart() as body_2:
    # Split Bodies 1: the piece behind the surface
    add(cut_extrude_17_piece_1_1.part)
    # Split Bodies 1 surface: a surface, the sketch's curves swept straight by 225.738 mm
    with BuildLine(Plane.XY.offset(2.9999999999999987).offset(-SPLIT_BODIES_1_SURFACE_1_BACK), mode=Mode.PRIVATE) as split_bodies_1_surface_1_path:
        Line((18.18944451175029, 22.20564291818672), (24.50576515259755, 13.244024981183752))
    split_bodies_1_surface_1 = Shell.extrude(split_bodies_1_surface_1_path.wire(), (0 * SPLIT_BODIES_1_SURFACE_1_DEPTH, 0 * SPLIT_BODIES_1_SURFACE_1_DEPTH, 1 * SPLIT_BODIES_1_SURFACE_1_DEPTH))
    split(bisect_by=split_bodies_1_surface_1, keep=Keep.BOTTOM)


with BuildPart() as cut_extrude_17_piece_1_2:
    add(cut_extrude_17_piece_1_1.part)

    # Split Bodies 1: split by a surface, the side it looks to stays
    # Split Bodies 1 surface: a surface, the sketch's curves swept straight by 225.738 mm
    with BuildLine(Plane.XY.offset(2.9999999999999987).offset(-SPLIT_BODIES_1_SURFACE_2_BACK), mode=Mode.PRIVATE) as split_bodies_1_surface_2_path:
        Line((18.18944451175029, 22.20564291818672), (24.50576515259755, 13.244024981183752))
    split_bodies_1_surface_2 = Shell.extrude(split_bodies_1_surface_2_path.wire(), (0 * SPLIT_BODIES_1_SURFACE_2_DEPTH, 0 * SPLIT_BODIES_1_SURFACE_2_DEPTH, 1 * SPLIT_BODIES_1_SURFACE_2_DEPTH))
    split(bisect_by=split_bodies_1_surface_2, keep=Keep.TOP)


with BuildPart() as body_3:
    # Move Body 3: copy of 切除-拉伸17 piece 1
    add(cut_extrude_17_piece_1_2.part.moved(Location((0, 0, 3))))

    # Combine 1: union body 2
    add(body_2.part)

    # 圆角11
    fillet_11_edges = [body_3.edges().sort_by_distance(p)[0] for p in [
        (21.347604832173918, 17.724833949685234, 3.0000000000000147),
    ]]
    fillet(fillet_11_edges, radius=FILLET_11_R)

    # 圆角12
    # the kernel refuses this fillet: 4 mm, written as the material it adds along each edge
    with BuildSketch(Plane(origin=(24.304129078917025, 13.530106951588564, 3.999999999999999), x_dir=(-5.198e-14, -3.664e-14, 1), z_dir=(-0.5761030676586324, 0.817377058299481, 0))) as fillet_12_piece_1:
        with BuildLine():
            CenterArc((4.000000000000221, -3.4641016151376753), FILLET_12_R, 120.00000000000229, 60.000000000001364)
            Line((2.212e-13, -3.46410161513793), (0, 0))
            Line((0, 0), (2.0000000000000826, 0))
        make_face()
    extrude(amount=10.263872604458996)


solid = body_3.part
